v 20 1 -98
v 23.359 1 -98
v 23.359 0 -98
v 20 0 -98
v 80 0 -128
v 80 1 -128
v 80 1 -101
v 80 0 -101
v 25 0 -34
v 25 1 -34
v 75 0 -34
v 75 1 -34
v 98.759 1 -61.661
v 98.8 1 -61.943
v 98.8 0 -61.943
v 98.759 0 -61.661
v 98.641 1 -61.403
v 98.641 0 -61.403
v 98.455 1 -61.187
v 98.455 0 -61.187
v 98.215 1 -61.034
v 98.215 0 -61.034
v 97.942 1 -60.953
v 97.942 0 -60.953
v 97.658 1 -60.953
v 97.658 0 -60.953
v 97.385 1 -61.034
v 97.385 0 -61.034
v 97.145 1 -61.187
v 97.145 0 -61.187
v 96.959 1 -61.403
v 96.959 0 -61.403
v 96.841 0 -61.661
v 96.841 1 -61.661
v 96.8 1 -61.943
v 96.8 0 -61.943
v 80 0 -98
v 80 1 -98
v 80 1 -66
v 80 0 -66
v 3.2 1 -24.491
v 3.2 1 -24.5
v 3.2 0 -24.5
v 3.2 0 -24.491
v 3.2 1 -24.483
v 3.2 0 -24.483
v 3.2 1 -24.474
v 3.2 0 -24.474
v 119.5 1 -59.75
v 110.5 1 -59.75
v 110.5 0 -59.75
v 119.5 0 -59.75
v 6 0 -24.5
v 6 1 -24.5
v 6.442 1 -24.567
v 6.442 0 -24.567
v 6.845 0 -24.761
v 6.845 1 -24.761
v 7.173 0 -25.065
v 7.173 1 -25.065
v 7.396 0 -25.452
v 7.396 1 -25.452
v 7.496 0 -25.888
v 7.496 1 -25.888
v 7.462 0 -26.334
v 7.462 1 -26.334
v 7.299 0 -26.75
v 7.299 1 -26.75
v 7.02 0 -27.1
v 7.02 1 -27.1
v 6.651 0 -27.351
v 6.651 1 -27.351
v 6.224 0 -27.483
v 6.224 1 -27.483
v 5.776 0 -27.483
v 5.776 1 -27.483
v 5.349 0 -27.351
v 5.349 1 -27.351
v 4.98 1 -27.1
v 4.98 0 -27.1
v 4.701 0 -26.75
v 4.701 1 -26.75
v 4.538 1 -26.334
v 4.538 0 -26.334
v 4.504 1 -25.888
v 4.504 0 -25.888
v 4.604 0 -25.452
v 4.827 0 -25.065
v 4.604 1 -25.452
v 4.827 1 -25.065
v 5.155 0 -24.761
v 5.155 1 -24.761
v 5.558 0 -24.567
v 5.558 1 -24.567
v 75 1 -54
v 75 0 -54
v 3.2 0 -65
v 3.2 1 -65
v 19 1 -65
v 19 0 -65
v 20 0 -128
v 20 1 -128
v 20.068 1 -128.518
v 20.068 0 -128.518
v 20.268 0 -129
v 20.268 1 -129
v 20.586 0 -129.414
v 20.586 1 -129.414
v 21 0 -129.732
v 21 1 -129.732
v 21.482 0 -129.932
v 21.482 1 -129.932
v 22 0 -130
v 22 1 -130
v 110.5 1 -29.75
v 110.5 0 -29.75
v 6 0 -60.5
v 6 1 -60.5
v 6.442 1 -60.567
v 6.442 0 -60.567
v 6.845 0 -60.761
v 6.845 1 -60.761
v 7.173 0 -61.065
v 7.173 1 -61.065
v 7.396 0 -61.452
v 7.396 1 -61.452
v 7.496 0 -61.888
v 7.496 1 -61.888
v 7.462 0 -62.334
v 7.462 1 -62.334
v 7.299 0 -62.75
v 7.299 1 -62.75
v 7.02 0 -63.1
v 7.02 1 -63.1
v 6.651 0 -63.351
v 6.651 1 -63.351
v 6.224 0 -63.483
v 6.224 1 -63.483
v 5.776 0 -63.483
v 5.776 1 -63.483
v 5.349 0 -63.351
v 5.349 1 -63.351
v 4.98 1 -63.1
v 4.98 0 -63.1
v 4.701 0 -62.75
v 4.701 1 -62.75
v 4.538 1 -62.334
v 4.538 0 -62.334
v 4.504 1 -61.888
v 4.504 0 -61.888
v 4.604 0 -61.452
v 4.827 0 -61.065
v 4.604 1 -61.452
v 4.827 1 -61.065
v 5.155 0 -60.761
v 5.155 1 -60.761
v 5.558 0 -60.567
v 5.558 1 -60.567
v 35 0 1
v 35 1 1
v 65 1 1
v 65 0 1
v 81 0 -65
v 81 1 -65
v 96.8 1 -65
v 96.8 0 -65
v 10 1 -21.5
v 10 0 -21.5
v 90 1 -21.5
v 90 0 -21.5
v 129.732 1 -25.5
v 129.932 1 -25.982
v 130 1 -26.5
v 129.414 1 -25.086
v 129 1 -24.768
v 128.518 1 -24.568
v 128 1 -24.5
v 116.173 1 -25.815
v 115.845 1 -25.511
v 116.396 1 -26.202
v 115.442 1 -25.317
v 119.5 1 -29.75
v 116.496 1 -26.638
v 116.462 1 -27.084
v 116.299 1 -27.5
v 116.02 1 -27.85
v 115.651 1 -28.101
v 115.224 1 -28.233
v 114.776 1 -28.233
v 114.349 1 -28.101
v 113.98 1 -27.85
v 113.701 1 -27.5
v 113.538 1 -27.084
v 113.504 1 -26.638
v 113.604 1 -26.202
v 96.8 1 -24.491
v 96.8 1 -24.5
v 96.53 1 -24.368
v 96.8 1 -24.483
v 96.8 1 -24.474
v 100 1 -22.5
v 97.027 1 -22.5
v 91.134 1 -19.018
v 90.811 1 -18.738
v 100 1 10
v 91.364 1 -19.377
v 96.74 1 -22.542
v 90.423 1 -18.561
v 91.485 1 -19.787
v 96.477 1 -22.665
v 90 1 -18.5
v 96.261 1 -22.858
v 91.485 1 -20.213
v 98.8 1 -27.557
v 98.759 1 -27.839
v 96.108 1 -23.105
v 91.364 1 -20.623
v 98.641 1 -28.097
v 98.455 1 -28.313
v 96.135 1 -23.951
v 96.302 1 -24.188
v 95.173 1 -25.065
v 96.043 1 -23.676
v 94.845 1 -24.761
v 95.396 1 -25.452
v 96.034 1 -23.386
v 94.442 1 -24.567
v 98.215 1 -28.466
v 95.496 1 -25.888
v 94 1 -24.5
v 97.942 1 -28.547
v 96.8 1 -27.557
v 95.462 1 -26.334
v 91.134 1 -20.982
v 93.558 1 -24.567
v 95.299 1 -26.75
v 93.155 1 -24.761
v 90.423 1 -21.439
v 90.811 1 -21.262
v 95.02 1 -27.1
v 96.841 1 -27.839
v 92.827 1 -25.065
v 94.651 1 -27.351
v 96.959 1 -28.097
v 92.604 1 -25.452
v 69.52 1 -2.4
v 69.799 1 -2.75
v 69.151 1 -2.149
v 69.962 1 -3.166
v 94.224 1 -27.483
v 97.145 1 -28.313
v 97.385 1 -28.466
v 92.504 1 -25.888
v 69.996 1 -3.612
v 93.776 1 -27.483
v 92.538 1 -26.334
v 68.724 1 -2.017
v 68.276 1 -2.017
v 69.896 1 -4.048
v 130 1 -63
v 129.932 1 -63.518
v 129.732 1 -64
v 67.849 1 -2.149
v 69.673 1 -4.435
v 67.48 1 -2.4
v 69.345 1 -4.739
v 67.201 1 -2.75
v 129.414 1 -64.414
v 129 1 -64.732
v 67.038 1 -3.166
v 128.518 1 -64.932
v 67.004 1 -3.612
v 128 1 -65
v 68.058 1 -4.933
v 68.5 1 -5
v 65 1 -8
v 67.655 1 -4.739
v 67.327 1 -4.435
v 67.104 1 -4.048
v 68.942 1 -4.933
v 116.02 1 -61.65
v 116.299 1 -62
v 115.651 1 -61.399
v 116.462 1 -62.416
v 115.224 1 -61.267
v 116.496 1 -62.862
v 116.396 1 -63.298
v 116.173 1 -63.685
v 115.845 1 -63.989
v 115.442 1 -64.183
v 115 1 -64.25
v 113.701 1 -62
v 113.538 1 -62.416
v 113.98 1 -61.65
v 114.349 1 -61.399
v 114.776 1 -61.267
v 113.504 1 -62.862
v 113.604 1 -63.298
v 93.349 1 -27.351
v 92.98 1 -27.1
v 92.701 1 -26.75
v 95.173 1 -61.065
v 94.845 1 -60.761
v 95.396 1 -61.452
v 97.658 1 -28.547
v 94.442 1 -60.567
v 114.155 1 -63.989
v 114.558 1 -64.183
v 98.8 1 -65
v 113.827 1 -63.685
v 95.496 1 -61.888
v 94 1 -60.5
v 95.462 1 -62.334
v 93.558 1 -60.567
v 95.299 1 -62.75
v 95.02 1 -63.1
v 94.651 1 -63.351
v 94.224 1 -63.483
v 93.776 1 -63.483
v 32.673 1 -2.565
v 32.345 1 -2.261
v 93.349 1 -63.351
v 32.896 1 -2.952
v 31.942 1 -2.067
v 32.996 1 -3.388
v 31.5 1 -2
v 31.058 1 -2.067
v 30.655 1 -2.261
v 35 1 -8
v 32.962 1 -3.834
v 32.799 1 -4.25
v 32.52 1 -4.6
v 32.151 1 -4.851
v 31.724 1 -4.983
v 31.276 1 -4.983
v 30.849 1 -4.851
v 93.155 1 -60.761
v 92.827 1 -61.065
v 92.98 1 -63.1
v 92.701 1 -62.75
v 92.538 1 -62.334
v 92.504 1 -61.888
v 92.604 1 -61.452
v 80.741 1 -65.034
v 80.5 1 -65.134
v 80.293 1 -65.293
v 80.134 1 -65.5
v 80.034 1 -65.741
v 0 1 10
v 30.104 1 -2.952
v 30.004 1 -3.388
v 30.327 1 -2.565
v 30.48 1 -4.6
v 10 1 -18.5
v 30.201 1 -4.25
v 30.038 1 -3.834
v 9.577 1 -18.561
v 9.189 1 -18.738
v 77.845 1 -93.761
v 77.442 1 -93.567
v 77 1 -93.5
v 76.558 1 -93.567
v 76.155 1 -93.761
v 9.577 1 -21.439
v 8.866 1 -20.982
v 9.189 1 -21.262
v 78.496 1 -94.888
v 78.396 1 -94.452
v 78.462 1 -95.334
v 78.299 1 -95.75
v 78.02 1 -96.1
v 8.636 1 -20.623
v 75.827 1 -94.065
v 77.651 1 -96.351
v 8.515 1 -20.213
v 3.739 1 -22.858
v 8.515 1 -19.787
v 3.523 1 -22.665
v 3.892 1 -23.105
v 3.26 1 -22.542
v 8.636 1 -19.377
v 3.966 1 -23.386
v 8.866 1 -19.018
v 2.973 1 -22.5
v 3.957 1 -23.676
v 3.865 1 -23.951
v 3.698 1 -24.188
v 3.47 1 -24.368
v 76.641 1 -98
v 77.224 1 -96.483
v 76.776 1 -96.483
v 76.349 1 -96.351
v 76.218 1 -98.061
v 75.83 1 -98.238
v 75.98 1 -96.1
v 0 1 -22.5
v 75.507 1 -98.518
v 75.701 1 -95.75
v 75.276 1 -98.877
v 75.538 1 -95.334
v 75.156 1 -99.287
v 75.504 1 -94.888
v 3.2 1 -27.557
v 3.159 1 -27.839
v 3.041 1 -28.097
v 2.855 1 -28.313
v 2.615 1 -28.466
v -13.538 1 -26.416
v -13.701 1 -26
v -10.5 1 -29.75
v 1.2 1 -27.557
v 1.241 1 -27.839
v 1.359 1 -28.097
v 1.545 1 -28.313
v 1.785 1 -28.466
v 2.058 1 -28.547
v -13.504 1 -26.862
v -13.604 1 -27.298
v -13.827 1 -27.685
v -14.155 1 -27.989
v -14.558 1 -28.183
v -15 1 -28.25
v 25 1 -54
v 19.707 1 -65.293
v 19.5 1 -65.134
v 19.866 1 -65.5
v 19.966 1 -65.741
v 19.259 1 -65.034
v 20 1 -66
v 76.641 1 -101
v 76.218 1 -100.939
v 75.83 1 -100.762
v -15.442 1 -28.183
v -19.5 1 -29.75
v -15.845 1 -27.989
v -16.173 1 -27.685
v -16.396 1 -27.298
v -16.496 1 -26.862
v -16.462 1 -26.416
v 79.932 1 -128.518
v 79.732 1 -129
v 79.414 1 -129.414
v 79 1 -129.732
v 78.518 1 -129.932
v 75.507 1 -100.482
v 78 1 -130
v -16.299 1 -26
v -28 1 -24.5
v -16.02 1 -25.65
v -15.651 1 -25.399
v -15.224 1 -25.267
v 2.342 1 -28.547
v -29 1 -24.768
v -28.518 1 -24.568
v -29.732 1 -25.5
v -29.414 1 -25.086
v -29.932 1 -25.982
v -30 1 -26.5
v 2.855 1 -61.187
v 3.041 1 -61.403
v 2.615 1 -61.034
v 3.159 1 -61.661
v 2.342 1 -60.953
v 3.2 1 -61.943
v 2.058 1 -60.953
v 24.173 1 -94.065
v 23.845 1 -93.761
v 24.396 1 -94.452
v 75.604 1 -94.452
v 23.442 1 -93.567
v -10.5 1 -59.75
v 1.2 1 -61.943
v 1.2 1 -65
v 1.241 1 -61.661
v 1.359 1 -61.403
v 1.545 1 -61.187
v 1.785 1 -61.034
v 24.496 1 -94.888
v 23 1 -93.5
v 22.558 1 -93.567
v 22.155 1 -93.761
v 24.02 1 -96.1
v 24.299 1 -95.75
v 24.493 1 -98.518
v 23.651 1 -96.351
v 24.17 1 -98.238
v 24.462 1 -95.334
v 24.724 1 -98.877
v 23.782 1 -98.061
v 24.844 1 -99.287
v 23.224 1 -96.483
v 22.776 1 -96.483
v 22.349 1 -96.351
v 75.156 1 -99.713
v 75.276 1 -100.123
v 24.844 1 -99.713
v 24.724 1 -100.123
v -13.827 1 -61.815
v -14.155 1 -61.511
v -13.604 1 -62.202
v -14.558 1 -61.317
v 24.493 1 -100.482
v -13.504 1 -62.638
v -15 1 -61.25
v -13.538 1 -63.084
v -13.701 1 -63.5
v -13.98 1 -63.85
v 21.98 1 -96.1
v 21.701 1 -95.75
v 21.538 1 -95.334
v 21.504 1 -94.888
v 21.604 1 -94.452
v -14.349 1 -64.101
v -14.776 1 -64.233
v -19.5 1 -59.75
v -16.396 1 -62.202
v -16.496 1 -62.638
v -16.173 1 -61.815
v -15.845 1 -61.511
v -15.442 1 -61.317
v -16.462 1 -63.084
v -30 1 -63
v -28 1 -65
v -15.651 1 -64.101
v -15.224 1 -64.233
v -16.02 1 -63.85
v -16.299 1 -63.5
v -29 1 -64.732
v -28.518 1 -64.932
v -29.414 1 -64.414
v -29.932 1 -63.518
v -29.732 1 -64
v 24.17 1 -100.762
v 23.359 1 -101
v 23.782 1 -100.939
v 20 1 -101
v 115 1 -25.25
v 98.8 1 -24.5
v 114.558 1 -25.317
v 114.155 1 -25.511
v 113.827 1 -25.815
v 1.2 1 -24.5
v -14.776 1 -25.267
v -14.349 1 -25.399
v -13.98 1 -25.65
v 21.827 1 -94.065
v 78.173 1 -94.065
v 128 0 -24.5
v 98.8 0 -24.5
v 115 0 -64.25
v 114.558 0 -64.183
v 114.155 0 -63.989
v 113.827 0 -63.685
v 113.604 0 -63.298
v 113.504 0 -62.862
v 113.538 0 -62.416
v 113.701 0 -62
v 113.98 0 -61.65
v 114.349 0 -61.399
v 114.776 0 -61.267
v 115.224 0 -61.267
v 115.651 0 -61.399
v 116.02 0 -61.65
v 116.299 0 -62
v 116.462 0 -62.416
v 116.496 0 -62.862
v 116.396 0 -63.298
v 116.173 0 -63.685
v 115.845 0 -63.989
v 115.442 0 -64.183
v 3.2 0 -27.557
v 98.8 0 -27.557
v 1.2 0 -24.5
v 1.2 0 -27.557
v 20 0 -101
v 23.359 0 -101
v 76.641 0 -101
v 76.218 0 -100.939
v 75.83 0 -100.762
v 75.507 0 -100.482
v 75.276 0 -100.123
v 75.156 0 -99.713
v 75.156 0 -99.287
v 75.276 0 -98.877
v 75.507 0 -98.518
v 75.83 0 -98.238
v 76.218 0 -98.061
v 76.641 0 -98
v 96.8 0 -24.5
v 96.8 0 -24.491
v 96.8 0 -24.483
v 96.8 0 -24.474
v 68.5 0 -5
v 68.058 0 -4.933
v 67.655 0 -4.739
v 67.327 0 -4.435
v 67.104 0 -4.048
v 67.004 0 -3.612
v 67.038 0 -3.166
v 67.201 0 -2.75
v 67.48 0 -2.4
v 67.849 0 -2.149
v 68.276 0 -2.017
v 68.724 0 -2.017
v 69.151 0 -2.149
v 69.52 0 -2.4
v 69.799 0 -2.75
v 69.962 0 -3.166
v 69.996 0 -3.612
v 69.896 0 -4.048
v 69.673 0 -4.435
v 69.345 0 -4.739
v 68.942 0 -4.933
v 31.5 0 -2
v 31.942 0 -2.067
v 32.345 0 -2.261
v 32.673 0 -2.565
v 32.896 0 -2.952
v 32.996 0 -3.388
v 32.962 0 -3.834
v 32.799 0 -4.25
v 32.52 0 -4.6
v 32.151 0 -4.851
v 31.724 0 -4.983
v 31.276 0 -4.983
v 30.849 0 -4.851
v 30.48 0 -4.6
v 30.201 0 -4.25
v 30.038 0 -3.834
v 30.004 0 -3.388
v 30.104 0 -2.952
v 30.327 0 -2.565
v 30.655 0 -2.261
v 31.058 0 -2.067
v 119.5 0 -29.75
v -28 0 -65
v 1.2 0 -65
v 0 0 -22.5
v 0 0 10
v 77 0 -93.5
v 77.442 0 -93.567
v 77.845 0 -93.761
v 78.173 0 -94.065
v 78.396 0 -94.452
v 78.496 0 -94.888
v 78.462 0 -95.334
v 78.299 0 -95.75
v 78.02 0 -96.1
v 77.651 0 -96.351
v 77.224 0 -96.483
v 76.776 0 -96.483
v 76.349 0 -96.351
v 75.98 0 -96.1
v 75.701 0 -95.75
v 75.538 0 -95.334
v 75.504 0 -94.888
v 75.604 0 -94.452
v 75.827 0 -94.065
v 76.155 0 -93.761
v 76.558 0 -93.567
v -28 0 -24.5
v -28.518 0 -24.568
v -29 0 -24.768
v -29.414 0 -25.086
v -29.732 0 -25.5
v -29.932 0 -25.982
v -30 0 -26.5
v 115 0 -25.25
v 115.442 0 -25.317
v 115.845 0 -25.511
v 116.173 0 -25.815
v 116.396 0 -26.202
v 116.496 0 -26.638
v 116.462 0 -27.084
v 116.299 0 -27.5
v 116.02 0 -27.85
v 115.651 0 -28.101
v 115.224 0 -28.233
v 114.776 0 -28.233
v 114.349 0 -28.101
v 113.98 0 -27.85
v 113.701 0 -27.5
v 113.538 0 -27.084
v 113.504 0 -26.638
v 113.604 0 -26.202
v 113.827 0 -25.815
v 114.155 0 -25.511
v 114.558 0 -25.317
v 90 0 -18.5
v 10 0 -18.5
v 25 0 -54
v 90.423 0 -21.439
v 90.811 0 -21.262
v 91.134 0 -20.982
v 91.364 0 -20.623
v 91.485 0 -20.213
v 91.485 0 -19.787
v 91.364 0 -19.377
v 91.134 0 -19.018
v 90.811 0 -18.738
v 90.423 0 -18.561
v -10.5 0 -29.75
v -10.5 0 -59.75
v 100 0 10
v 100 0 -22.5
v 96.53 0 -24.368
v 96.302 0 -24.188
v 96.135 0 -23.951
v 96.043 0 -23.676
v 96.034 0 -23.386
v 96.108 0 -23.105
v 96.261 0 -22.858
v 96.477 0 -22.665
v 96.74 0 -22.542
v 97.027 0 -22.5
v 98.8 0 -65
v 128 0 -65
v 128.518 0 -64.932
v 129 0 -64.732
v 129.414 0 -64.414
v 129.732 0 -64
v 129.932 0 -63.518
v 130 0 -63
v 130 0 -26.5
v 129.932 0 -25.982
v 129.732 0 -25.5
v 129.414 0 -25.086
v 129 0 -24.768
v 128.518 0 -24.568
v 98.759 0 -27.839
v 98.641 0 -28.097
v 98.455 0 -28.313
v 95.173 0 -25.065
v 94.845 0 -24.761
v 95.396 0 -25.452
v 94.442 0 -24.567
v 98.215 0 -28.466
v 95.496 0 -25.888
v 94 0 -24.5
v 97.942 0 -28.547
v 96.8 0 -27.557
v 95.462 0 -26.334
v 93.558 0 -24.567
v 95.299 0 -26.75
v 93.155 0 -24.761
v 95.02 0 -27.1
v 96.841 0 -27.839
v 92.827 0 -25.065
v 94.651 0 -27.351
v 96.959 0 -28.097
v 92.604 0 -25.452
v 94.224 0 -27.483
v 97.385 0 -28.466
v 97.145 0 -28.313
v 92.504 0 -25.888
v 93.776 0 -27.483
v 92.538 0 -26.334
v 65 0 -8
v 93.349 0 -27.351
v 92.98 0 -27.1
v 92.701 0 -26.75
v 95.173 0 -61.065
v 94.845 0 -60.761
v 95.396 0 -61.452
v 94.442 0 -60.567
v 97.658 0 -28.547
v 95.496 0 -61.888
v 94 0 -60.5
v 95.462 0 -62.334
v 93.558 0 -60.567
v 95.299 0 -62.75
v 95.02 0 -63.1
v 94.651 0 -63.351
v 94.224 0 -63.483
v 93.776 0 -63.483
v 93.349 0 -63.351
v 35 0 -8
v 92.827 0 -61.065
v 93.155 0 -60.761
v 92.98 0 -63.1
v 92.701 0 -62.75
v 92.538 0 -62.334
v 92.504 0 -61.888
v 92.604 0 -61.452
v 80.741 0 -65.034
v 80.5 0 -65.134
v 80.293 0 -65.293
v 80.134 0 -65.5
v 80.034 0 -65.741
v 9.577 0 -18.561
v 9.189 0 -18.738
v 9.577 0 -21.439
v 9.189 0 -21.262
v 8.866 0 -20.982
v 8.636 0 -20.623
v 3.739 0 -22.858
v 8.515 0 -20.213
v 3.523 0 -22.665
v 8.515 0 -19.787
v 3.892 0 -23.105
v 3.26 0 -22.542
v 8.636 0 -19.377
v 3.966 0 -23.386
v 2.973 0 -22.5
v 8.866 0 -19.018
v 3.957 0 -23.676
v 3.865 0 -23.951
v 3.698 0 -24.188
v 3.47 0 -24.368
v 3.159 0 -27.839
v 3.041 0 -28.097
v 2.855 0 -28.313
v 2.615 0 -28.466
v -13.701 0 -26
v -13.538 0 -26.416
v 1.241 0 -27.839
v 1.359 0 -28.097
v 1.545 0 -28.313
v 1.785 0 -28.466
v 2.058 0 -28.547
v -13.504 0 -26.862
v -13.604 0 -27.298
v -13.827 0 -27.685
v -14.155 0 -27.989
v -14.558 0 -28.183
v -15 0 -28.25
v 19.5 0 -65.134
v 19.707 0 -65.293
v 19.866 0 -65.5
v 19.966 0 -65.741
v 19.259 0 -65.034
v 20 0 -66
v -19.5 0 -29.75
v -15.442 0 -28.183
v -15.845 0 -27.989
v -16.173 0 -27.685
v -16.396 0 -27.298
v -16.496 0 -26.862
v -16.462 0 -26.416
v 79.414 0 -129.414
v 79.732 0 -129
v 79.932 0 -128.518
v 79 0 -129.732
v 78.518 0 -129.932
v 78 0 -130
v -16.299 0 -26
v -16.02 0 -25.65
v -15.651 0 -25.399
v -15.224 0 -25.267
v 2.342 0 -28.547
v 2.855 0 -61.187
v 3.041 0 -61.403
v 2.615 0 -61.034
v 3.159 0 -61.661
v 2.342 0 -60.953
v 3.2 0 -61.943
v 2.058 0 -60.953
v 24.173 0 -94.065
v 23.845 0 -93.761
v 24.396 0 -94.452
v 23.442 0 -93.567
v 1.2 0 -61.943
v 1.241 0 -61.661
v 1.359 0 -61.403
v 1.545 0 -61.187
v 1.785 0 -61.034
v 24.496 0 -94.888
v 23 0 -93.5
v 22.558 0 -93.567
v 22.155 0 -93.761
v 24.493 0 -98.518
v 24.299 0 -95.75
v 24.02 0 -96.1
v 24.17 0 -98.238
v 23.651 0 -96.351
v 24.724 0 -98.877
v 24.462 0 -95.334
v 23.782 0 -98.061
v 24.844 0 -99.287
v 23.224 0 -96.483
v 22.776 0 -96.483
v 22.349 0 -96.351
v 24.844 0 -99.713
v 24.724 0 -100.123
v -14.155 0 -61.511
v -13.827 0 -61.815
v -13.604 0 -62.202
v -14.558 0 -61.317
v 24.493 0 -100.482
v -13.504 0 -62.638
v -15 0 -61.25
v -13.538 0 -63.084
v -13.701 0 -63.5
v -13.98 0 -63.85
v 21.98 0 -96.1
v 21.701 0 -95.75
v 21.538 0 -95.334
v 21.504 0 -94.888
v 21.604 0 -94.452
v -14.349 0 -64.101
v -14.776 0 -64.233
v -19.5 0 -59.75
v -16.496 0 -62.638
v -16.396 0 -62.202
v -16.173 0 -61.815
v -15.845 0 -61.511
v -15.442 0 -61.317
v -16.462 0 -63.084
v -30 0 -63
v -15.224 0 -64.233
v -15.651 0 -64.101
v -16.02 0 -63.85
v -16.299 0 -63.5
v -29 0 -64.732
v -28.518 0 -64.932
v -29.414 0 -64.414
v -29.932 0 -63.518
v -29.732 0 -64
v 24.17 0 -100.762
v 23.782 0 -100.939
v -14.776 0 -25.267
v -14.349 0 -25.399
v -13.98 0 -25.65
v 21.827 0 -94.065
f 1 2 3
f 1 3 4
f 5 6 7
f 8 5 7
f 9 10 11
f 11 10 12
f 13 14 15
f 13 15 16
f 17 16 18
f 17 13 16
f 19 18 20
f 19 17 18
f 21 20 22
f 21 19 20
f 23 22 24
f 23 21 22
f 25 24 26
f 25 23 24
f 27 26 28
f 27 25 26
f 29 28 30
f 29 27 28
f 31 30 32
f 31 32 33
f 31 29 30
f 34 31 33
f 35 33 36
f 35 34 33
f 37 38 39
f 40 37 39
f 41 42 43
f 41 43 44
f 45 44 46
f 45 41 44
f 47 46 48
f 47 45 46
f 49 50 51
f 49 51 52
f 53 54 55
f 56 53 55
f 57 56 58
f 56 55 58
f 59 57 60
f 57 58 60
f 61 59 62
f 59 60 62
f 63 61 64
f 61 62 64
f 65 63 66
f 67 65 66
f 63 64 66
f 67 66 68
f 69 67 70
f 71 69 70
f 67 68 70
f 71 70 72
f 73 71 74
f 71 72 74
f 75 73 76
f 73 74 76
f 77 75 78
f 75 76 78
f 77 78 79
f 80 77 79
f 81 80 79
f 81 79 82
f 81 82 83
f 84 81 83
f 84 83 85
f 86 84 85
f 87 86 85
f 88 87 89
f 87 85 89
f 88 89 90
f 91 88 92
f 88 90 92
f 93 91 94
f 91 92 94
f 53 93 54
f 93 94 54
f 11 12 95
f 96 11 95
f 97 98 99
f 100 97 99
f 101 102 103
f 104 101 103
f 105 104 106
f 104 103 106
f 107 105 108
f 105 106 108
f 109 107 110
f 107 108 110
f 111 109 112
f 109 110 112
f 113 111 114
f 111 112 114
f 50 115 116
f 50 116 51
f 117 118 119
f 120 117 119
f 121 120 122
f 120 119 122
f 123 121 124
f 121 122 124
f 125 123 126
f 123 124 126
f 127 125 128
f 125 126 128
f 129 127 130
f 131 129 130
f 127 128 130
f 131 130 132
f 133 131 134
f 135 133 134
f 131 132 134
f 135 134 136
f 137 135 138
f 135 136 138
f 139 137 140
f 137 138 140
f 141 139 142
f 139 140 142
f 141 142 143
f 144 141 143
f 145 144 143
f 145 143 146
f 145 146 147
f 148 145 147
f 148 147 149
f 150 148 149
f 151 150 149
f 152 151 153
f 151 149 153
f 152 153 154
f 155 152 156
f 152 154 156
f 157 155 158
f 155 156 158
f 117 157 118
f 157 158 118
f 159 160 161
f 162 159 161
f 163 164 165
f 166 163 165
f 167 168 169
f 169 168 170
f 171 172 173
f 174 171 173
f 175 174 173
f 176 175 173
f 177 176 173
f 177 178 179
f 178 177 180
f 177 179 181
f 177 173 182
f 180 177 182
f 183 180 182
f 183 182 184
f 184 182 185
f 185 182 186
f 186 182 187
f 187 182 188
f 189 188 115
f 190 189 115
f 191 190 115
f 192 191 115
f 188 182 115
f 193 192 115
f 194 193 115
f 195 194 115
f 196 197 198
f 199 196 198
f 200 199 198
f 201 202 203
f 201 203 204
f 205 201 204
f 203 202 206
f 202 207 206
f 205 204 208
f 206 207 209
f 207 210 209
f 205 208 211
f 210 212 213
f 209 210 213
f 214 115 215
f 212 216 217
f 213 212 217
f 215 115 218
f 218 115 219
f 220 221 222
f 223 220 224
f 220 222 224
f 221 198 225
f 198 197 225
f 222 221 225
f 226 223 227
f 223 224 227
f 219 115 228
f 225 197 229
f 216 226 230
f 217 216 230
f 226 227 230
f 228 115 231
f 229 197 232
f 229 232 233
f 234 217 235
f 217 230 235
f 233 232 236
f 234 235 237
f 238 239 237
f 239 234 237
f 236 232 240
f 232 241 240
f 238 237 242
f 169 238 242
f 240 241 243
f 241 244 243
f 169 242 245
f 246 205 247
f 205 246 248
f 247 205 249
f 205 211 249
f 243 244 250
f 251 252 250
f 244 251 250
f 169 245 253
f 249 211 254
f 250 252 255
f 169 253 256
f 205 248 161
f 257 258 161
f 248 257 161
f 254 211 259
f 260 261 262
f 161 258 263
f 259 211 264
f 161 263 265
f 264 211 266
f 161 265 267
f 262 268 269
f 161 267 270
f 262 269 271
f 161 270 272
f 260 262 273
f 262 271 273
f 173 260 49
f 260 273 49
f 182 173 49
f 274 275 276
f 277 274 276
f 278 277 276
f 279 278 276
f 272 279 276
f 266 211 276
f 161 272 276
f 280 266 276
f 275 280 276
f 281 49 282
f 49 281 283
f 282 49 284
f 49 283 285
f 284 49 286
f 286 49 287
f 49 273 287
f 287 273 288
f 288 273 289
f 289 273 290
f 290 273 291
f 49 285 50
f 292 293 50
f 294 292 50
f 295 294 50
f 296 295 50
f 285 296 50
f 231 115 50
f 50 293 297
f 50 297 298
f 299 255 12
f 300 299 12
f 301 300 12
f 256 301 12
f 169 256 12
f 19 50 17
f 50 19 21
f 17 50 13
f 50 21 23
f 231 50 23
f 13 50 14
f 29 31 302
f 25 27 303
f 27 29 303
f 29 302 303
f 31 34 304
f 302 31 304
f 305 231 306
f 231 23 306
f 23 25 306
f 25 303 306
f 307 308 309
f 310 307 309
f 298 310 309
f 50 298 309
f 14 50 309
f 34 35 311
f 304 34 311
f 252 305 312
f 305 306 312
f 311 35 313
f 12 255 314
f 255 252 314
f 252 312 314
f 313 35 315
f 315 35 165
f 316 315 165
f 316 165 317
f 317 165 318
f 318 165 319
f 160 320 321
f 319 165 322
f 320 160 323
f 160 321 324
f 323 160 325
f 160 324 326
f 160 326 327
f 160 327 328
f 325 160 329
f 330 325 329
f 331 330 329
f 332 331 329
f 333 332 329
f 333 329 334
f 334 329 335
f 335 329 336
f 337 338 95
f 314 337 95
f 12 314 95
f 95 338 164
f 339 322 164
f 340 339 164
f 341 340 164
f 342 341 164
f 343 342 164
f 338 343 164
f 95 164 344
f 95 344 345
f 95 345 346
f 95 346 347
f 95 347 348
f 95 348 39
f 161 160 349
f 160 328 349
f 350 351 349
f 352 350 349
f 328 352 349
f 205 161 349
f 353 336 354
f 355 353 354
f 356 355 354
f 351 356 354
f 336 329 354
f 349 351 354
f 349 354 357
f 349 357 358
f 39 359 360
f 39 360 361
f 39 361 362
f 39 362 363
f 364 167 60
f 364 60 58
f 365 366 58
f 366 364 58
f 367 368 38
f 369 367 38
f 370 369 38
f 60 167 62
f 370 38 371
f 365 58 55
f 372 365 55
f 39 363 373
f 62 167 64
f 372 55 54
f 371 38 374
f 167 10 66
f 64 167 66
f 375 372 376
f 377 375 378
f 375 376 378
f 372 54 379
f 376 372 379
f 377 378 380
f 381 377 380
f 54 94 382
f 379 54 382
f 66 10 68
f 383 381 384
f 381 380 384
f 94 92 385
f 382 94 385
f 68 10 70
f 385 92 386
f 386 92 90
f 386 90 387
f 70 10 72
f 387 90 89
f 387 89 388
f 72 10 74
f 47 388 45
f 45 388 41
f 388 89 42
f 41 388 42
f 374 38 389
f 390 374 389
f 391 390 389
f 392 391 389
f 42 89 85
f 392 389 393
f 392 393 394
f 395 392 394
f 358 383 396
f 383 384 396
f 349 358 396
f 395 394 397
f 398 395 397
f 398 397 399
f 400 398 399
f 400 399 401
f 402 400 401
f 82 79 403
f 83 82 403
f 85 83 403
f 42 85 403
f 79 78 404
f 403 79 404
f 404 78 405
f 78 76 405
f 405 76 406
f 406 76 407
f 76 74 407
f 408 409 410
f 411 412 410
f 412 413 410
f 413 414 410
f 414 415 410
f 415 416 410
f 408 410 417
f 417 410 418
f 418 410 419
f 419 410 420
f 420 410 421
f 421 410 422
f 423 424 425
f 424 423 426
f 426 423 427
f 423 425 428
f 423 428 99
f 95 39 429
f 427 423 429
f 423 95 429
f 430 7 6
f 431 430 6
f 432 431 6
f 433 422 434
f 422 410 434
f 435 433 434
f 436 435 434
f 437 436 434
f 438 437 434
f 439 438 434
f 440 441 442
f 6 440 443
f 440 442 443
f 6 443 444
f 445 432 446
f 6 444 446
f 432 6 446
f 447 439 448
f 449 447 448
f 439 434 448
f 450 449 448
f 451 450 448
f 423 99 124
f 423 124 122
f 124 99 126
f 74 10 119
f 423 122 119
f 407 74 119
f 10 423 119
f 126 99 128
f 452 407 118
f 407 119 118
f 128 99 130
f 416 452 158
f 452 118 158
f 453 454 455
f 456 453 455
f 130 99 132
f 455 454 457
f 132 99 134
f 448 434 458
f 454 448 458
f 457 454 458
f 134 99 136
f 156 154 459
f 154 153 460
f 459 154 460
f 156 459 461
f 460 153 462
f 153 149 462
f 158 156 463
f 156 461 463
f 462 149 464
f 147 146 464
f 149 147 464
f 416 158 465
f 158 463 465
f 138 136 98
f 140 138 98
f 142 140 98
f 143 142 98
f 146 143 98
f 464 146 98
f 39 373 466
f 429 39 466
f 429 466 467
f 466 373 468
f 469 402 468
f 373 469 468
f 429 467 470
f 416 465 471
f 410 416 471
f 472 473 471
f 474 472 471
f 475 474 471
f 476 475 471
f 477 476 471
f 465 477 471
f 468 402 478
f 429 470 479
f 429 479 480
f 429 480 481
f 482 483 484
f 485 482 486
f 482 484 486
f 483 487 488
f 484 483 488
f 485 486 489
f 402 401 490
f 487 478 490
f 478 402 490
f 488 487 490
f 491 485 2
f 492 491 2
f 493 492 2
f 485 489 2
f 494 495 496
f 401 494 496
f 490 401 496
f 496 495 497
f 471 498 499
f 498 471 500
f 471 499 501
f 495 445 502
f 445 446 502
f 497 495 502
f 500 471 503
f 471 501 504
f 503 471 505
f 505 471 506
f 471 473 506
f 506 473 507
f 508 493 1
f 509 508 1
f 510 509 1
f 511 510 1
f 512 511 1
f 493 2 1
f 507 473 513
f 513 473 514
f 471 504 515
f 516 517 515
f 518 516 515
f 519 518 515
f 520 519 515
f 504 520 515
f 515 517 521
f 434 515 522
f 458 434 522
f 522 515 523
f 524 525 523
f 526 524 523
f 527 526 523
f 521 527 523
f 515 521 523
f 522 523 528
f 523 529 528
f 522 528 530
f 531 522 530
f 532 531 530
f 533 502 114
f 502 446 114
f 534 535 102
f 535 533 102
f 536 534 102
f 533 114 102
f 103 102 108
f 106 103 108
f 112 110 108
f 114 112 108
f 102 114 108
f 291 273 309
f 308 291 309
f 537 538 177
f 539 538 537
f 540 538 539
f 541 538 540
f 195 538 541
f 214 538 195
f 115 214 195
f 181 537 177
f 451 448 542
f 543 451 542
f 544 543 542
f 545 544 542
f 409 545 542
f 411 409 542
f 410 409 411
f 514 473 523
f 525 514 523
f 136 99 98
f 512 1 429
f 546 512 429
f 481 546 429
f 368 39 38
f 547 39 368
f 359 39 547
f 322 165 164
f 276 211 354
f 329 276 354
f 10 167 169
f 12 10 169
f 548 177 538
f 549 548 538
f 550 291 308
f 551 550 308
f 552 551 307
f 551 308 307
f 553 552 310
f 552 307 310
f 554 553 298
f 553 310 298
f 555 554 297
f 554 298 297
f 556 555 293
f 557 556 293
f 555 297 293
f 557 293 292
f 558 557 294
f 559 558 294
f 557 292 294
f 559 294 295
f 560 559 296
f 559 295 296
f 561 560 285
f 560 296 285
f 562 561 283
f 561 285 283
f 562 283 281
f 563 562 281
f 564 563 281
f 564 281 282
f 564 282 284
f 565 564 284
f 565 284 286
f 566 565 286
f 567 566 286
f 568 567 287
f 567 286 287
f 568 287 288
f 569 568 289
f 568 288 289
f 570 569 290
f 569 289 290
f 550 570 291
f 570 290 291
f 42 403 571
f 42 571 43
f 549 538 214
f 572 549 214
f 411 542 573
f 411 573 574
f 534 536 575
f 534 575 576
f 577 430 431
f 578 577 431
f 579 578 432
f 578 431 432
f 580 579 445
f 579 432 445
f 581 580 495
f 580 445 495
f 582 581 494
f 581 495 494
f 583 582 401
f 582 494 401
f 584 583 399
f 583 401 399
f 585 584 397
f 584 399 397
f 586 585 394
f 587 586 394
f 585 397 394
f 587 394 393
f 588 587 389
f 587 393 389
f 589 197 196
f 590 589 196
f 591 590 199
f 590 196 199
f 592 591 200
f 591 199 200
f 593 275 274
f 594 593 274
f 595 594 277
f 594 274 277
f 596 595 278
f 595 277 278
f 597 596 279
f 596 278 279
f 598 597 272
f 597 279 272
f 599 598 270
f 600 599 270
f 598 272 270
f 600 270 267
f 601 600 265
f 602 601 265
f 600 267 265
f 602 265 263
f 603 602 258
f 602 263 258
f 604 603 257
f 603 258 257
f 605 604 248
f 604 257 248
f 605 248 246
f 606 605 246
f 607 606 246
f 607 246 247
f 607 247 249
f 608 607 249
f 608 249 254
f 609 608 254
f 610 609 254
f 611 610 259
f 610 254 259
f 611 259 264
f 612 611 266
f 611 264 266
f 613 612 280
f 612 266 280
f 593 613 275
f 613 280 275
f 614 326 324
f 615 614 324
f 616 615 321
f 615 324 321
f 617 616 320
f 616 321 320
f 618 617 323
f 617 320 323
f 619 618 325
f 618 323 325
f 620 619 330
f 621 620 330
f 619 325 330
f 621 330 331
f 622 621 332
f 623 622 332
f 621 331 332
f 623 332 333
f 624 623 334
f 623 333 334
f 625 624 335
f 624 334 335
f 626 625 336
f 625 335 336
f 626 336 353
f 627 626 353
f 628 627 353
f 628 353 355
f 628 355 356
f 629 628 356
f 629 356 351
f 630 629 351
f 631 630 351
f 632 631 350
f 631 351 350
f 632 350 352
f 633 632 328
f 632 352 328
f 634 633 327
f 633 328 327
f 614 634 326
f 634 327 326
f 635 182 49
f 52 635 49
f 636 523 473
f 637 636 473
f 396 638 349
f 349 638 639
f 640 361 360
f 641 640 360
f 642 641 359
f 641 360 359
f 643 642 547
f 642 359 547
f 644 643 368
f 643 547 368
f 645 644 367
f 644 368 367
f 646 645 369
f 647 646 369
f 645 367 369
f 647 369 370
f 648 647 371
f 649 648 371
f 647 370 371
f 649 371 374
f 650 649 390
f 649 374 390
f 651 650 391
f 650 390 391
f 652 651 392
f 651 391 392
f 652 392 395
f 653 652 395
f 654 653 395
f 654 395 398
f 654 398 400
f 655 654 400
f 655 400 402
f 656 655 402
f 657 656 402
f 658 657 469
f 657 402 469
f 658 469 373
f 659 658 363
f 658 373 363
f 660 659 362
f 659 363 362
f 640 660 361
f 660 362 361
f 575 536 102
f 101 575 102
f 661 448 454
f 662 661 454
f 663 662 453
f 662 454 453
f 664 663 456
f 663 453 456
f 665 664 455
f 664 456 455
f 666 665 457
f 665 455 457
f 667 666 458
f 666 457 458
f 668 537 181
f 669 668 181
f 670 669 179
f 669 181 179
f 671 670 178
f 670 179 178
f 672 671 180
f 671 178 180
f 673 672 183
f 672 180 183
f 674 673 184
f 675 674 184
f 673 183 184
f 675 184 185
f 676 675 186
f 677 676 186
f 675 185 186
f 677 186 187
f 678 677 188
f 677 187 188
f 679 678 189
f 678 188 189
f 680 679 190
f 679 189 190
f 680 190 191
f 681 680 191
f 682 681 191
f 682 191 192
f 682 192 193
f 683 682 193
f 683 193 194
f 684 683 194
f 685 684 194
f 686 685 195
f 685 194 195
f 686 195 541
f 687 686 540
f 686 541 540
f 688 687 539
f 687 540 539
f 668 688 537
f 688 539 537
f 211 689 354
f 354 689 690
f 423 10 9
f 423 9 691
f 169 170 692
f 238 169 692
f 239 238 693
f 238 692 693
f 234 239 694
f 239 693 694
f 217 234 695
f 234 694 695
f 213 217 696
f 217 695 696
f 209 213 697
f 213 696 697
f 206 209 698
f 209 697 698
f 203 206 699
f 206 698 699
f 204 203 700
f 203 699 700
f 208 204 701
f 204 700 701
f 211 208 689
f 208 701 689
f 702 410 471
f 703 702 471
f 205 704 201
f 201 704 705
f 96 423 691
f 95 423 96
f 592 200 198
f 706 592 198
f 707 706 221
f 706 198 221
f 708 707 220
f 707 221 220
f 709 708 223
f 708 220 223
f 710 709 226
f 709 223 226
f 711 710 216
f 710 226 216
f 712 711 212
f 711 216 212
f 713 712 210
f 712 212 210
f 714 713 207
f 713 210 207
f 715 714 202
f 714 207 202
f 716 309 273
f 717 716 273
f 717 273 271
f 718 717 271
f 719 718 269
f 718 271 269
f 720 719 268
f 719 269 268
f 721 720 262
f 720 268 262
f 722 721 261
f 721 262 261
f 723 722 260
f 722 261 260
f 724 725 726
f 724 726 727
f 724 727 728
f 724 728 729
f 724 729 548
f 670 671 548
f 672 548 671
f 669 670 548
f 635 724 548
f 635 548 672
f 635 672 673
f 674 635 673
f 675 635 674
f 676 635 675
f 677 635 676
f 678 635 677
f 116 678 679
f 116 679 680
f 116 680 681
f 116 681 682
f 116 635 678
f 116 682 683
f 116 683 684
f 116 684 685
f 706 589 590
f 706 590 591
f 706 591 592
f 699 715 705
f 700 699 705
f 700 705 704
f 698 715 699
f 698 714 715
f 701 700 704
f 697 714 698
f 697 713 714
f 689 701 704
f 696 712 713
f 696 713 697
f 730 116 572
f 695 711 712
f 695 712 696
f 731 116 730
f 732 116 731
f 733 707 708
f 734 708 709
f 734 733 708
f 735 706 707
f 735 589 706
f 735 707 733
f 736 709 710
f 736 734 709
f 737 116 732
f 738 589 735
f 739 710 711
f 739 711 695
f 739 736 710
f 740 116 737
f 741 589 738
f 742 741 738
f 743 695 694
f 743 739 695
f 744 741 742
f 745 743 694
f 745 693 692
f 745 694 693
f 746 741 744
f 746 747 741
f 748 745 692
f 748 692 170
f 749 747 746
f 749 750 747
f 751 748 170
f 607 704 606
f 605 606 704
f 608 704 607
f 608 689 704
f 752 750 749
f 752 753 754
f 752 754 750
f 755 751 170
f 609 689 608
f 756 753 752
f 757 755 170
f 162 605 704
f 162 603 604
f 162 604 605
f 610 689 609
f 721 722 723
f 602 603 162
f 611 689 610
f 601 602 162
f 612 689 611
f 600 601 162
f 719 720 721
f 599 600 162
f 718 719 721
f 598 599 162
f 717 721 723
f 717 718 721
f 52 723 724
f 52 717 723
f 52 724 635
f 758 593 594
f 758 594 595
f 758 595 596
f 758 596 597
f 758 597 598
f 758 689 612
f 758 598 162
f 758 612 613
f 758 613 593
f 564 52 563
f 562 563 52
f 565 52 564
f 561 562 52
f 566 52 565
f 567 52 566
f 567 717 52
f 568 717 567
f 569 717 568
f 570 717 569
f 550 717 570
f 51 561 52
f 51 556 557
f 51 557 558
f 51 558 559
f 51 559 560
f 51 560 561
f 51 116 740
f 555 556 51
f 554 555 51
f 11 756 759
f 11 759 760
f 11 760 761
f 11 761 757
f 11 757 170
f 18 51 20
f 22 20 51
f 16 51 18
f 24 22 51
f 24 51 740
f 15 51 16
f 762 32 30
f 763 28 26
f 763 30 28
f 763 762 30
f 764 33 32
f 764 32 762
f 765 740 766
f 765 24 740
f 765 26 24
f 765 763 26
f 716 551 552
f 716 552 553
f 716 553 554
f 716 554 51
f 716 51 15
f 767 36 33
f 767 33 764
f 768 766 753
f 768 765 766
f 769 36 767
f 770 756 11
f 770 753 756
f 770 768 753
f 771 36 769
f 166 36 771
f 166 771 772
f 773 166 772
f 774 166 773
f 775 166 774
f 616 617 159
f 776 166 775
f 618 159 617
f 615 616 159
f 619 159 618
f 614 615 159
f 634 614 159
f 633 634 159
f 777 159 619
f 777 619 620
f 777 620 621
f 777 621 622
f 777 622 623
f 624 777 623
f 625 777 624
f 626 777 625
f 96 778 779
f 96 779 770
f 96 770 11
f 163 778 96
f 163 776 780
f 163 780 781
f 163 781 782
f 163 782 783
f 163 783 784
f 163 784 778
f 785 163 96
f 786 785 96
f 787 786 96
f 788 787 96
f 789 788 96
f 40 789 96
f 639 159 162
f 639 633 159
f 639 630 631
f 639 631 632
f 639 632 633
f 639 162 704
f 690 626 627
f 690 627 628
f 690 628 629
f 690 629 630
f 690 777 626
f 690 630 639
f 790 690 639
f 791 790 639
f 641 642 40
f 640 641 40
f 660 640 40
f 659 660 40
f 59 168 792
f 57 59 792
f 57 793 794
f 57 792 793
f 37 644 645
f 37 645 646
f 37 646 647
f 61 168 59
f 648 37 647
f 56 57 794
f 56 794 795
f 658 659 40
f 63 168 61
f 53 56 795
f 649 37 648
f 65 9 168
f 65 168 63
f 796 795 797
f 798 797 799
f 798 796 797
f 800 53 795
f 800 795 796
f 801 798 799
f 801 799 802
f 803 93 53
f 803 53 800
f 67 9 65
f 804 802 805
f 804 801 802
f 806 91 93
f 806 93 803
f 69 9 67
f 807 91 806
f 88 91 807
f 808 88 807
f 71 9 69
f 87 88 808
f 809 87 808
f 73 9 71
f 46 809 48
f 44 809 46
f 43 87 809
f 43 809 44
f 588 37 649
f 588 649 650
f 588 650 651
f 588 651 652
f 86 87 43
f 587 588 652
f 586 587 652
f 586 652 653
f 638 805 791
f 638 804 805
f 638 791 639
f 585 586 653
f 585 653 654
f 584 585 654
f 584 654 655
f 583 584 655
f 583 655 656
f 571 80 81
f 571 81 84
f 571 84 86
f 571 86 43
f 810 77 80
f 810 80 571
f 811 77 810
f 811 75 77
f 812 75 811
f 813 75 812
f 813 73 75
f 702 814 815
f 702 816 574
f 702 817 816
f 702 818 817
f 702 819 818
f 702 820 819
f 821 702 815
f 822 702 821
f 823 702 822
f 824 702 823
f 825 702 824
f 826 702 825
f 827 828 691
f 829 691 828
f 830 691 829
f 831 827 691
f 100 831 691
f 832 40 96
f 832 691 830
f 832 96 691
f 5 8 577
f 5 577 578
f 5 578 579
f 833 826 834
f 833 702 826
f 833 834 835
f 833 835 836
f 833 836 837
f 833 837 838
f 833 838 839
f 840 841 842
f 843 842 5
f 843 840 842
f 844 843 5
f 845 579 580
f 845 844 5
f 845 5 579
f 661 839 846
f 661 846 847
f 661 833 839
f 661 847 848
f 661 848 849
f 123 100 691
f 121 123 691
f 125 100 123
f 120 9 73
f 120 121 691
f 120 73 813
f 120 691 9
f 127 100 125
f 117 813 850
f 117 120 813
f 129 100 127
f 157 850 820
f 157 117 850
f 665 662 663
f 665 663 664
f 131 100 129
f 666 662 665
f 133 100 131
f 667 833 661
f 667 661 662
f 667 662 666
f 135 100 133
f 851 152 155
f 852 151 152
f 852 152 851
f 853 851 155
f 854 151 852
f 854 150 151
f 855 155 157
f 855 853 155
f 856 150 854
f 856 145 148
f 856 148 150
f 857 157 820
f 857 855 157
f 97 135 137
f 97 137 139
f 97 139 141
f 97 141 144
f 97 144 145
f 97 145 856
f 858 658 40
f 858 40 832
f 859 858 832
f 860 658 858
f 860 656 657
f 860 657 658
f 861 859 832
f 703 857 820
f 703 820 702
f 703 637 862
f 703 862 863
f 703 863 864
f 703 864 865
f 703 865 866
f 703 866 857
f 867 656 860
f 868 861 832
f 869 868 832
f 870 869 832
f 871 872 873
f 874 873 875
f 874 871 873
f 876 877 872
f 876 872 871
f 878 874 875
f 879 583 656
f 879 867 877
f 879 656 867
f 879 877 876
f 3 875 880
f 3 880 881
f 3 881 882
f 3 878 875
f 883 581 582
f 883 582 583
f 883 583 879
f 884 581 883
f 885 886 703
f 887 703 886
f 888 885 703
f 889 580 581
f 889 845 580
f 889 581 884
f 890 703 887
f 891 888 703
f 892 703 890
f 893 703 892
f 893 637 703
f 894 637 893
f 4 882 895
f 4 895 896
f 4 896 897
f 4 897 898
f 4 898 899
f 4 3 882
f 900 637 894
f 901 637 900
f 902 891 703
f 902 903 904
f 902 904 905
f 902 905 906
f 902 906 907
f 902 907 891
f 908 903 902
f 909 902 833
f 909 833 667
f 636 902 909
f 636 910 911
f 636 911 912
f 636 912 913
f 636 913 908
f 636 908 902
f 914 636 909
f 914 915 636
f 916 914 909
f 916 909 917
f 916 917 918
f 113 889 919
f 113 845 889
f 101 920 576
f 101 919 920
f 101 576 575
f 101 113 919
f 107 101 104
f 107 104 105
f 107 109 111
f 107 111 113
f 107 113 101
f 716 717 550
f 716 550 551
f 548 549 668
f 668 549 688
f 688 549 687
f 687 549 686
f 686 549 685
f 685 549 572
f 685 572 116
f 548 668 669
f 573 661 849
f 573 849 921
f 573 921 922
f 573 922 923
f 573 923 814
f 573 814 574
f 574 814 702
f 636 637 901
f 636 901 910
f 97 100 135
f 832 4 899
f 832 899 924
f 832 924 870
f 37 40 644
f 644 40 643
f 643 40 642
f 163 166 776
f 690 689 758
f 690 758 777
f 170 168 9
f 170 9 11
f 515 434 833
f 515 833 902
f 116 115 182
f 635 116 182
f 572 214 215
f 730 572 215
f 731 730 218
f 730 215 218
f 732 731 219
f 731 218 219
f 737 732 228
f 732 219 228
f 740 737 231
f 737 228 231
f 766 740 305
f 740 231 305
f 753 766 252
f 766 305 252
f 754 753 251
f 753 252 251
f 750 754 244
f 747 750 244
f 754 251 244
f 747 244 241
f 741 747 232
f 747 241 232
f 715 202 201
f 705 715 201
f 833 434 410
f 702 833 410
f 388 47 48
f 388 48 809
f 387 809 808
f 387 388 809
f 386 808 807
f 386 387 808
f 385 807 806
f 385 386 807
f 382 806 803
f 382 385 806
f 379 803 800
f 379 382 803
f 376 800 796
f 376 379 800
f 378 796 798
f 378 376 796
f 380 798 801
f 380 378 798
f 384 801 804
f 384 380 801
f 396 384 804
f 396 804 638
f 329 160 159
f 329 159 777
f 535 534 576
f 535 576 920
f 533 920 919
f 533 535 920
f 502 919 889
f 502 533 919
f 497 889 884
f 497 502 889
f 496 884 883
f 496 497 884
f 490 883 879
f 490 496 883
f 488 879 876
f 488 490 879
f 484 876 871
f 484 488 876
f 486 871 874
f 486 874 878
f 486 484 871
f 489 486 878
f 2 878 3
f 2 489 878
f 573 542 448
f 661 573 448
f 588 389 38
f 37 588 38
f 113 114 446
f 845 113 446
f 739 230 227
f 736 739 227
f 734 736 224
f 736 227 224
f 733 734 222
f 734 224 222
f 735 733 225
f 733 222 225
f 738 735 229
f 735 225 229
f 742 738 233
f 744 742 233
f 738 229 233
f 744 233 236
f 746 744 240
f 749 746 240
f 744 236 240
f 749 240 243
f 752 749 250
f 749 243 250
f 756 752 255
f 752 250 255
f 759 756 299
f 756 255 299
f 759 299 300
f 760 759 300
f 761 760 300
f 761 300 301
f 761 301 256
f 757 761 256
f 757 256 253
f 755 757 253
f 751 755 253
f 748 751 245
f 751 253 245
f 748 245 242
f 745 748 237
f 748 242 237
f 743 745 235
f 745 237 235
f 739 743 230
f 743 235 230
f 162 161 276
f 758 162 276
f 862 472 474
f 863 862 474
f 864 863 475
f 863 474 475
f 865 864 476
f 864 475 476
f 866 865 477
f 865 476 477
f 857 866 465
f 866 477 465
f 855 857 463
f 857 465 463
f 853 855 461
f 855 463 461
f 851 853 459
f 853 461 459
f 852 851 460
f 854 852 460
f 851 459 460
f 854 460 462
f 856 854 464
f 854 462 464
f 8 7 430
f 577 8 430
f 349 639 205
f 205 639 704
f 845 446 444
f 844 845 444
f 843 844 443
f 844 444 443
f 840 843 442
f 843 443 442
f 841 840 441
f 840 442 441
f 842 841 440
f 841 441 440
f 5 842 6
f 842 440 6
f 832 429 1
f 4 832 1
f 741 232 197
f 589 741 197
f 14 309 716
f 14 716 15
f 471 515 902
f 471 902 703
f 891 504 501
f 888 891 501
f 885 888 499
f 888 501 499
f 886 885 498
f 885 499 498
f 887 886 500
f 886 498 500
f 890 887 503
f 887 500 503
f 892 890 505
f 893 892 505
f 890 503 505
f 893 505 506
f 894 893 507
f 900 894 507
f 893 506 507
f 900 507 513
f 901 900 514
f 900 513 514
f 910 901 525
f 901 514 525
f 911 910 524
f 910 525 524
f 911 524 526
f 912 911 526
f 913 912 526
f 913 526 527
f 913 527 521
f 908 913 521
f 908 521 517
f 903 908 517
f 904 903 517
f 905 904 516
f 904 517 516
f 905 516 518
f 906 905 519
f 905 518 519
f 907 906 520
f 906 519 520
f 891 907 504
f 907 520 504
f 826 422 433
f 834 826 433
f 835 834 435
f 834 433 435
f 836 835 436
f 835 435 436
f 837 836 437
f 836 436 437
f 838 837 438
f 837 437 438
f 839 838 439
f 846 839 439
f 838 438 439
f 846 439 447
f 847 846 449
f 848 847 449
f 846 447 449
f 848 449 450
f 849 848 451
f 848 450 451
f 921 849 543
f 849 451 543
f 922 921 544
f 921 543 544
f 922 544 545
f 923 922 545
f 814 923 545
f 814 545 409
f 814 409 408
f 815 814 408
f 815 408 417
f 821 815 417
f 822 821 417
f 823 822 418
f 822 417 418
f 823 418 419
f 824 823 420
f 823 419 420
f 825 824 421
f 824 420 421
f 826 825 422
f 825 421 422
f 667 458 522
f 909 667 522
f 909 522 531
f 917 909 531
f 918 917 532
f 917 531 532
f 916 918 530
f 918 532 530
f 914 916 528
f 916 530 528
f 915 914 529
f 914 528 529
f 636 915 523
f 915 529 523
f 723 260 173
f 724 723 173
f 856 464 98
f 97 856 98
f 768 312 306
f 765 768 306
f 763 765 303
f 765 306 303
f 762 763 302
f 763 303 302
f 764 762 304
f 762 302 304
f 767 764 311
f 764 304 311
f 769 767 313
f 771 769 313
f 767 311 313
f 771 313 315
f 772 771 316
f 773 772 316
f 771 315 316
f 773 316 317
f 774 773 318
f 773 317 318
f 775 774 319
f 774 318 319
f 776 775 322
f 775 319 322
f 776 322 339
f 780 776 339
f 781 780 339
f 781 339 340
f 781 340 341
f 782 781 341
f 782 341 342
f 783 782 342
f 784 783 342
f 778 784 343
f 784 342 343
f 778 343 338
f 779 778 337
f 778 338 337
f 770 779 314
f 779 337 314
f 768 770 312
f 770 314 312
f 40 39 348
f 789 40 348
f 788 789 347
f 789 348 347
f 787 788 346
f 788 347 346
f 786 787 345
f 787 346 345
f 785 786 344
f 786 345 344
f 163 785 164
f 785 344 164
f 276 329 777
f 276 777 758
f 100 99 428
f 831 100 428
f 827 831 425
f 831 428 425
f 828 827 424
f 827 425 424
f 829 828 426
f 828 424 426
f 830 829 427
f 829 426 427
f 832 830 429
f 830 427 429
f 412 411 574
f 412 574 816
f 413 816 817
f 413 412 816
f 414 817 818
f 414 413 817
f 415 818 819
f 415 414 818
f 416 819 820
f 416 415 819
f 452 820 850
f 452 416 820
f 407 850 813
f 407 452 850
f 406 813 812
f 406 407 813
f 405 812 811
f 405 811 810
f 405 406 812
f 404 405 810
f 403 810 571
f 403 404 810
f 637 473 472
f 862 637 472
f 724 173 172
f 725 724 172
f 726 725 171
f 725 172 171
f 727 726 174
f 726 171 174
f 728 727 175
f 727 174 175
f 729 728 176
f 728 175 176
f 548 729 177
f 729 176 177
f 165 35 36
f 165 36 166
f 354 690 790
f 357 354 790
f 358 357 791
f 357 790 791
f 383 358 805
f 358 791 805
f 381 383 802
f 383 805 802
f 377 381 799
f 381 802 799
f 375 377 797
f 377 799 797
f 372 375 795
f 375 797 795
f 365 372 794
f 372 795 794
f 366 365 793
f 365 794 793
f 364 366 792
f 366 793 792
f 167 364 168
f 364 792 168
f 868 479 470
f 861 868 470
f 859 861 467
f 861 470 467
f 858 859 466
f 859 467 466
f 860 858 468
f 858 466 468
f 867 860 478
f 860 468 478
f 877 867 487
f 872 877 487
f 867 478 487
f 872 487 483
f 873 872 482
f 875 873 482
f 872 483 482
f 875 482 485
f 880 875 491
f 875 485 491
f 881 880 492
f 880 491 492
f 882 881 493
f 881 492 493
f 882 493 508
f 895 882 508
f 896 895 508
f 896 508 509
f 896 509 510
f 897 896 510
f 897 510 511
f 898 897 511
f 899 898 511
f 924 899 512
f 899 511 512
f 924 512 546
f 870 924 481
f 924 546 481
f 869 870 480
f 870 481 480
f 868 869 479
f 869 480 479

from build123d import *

# Parameters (mm, degrees)
BOSS_EXTRUDE1_DEPTH = 1
CUT_EXTRUDE2_DEPTH  = 1
SKETCH3_R           = 1.5
CUT_EXTRUDE3_DEPTH  = 1
BOSS_EXTRUDE2_START = -1
BOSS_EXTRUDE2_DEPTH = 1
BOSS_EXTRUDE3_DEPTH = 1
SKETCH6_R           = 1.5
SKETCH6_W           = 9
SKETCH6_H           = 30
SKETCH6_W_2         = 30
SKETCH6_H_2         = 9
CUT_EXTRUDE4_DEPTH  = 1
CUT_EXTRUDE5_DEPTH  = 1
SKETCH8_W           = 50
SKETCH8_H           = 20
CUT_EXTRUDE6_DEPTH  = 1


with BuildPart() as part:
    # Sketch1 → Boss-Extrude1 (new body)
    with BuildSketch(Plane(origin=(0, 0, 0), x_dir=(1, 0, 0), z_dir=(0, 1, 0))):
        with BuildLine():
            Line((1, 0), (99, 0))
            ThreePointArc((99, 0), (99.707106781, 0.292893219), (100, 1))
            Line((100, 1), (100, 99))
            ThreePointArc((100, 99), (99.707106781, 99.707106781), (99, 100))
            Line((99, 100), (1, 100))
            ThreePointArc((1, 100), (0.292893219, 99.707106781), (0, 99))
            Line((0, 99), (0, 1))
            ThreePointArc((0, 1), (0.292893219, 0.292893219), (1, 0))
        make_face()
        with BuildLine():
            Line((10, 21.5), (90, 21.5))
            ThreePointArc((90, 21.5), (91.5, 20), (90, 18.5))
            Line((90, 18.5), (10, 18.5))
            ThreePointArc((10, 18.5), (8.5, 20), (10, 21.5))
        make_face(mode=Mode.SUBTRACT)
    extrude(amount=BOSS_EXTRUDE1_DEPTH)

    # Sketch2 → Cut-Extrude2 (cut)
    with BuildSketch(Plane(origin=(0, 1, 0), x_dir=(1, 0, 0), z_dir=(0, 1, 0))):
        with BuildLine():
            Line((0, 100), (0, 65))
            Line((0, 65), (19, 65))
            ThreePointArc((19, 65), (19.707106781, 65.292893219), (20, 66))
            Line((20, 66), (20, 100))
            Line((20, 100), (0, 100))
        make_face()
        with BuildLine():
            Line((100, 65), (100, 100))
            Line((100, 100), (80, 100))
            Line((80, 100), (80, 66))
            ThreePointArc((80, 66), (80.292893219, 65.292893219), (81, 65))
            Line((81, 65), (100, 65))
        make_face()
    extrude(amount=-CUT_EXTRUDE2_DEPTH, mode=Mode.SUBTRACT)

    # Sketch3 → Cut-Extrude3 (cut)
    with BuildSketch(Plane(origin=(0, 1, 0), x_dir=(1, 0, 0), z_dir=(0, 1, 0))):
        with Locations(Location((6, 26, 0), (0, 0, 270))):
            Circle(SKETCH3_R)
        with Locations(Location((23, 95, 0), (0, 0, 270))):
            Circle(SKETCH3_R)
        with Locations(Location((77, 95, 0), (0, 0, 270))):
            Circle(SKETCH3_R)
        with Locations(Location((94, 26, 0), (0, 0, 270))):
            Circle(SKETCH3_R)
        with Locations(Location((6, 62, 0), (0, 0, 270))):
            Circle(SKETCH3_R)
        with Locations(Location((94, 62, 0), (0, 0, 270))):
            Circle(SKETCH3_R)
    extrude(amount=-CUT_EXTRUDE3_DEPTH, mode=Mode.SUBTRACT)

    # Sketch4 → Boss-Extrude2 (add)
    with BuildSketch(Plane(origin=(0, 1, 0), x_dir=(1, 0, 0), z_dir=(0, 1, 0)).offset(BOSS_EXTRUDE2_START)):
        with BuildLine():
            Line((0, 1), (0, -10))
            Line((0, -10), (100, -10))
            Line((100, -10), (100, 1))
            ThreePointArc((100, 1), (99.707106781, 0.292893219), (99, 0))
            Line((99, 0), (1, 0))
            ThreePointArc((1, 0), (0.292893219, 0.292893219), (0, 1))
        make_face()
    extrude(amount=BOSS_EXTRUDE2_DEPTH)

    # Sketch5 → Boss-Extrude3 (add)
    with BuildSketch(Plane(origin=(0, 1, 0), x_dir=(1, 0, 0), z_dir=(0, 1, 0))):
        with BuildLine():
            Line((100, 65), (128, 65))
            ThreePointArc((128, 65), (129.414213562, 64.414213562), (130, 63))
            Line((130, 63), (130, 26.5))
            ThreePointArc((130, 26.5), (129.414213562, 25.085786438), (128, 24.5))
            Line((128, 24.5), (100, 24.5))
            Line((100, 24.5), (100, 65))
        make_face()
        with BuildLine():
            Line((0, 24.5), (-28, 24.5))
            ThreePointArc((-28, 24.5), (-29.414213562, 25.085786438), (-30, 26.5))
            Line((-30, 26.5), (-30, 63))
            ThreePointArc((-30, 63), (-29.414213562, 64.414213562), (-28, 65))
            Line((-28, 65), (0, 65))
            Line((0, 65), (0, 24.5))
        make_face()
        with BuildLine():
            Line((80, 100), (20, 100))
            Line((20, 100), (20, 128))
            ThreePointArc((20, 128), (20.585786438, 129.414213562), (22, 130))
            Line((22, 130), (78, 130))
            ThreePointArc((78, 130), (79.414213562, 129.414213562), (80, 128))
            Line((80, 128), (80, 100))
        make_face()
    extrude(amount=-BOSS_EXTRUDE3_DEPTH)

    # Sketch6 → Cut-Extrude4 (cut)
    with BuildSketch(Plane(origin=(0, 1, 0), x_dir=(1, 0, 0), z_dir=(0, 1, 0))):
        with Locations(Location((31.5, 3.5, 0), (0, 0, 270))):
            Circle(SKETCH6_R)
        with Locations(Location((-15, 62.75, 0), (0, 0, 270))):
            Circle(SKETCH6_R)
        with Locations(Location((-15, 26.75, 0), (0, 0, 90))):
            Circle(SKETCH6_R)
        with Locations(Location((68.5, 3.5, 0), (0, 0, 90))):
            Circle(SKETCH6_R)
        with Locations(Location((115, 26.75, 0), (0, 0, 270))):
            Circle(SKETCH6_R)
        with Locations(Location((115, 62.75, 0), (0, 0, 90))):
            Circle(SKETCH6_R)
        with Locations((115, 44.75)):
            Rectangle(SKETCH6_W, SKETCH6_H)
        with Locations((-15, 44.75)):
            Rectangle(SKETCH6_W, SKETCH6_H)
        with Locations((50, 3.5)):
            Rectangle(SKETCH6_W_2, SKETCH6_H_2)
    extrude(amount=-CUT_EXTRUDE4_DEPTH, mode=Mode.SUBTRACT)

    # Sketch7 → Cut-Extrude5 (cut)
    with BuildSketch(Plane(origin=(0, 1, 0), x_dir=(1, 0, 0), z_dir=(0, 1, 0))):
        with BuildLine():
            Line((0, 24.5), (2.972707359, 24.5))
            ThreePointArc((2.972707359, 24.5), (3.972707359, 23.5), (2.972707359, 22.5))
            Line((2.972707359, 22.5), (0, 22.5))
            ThreePointArc((0, 22.5), (-1, 23.5), (0, 24.5))
        make_face()
        with BuildLine():
            Line((19.996436831, 101), (23.359178087, 101))
            ThreePointArc((23.359178087, 101), (24.859178087, 99.5), (23.359178087, 98))
            Line((23.359178087, 98), (19.996436831, 98))
            ThreePointArc((19.996436831, 98), (18.496436831, 99.5), (19.996436831, 101))
        make_face()
        with BuildLine():
            Line((1.2, 24.5), (1.2, 27.556784127))
            ThreePointArc((1.2, 27.556784127), (2.2, 28.556784127), (3.2, 27.556784127))
            Line((3.2, 27.556784127), (3.2, 24.5))
            ThreePointArc((3.2, 24.5), (2.2, 23.5), (1.2, 24.5))
        make_face()
        with BuildLine():
            Line((1.2, 65), (1.2, 61.943215873))
            ThreePointArc((1.2, 61.943215873), (2.2, 60.943215873), (3.2, 61.943215873))
            Line((3.2, 61.943215873), (3.2, 65))
            ThreePointArc((3.2, 65), (2.2, 66), (1.2, 65))
        make_face()
        with BuildLine():
            Line((80.003563169, 101), (76.640821913, 101))
            ThreePointArc((76.640821913, 101), (75.140821913, 99.5), (76.640821913, 98))
            Line((76.640821913, 98), (80.003563169, 98))
            ThreePointArc((80.003563169, 98), (81.503563169, 99.5), (80.003563169, 101))
        make_face()
        with BuildLine():
            Line((98.8, 24.5), (98.8, 27.556784127))
            ThreePointArc((98.8, 27.556784127), (97.8, 28.556784127), (96.8, 27.556784127))
            Line((96.8, 27.556784127), (96.8, 24.5))
            ThreePointArc((96.8, 24.5), (97.8, 23.5), (98.8, 24.5))
        make_face()
        with BuildLine():
            Line((100, 24.5), (97.027292641, 24.5))
            ThreePointArc((97.027292641, 24.5), (96.027292641, 23.5), (97.027292641, 22.5))
            Line((97.027292641, 22.5), (100, 22.5))
            ThreePointArc((100, 22.5), (101, 23.5), (100, 24.5))
        make_face()
        with BuildLine():
            Line((98.8, 65), (98.8, 61.943215873))
            ThreePointArc((98.8, 61.943215873), (97.8, 60.943215873), (96.8, 61.943215873))
            Line((96.8, 61.943215873), (96.8, 65))
            ThreePointArc((96.8, 65), (97.8, 66), (98.8, 65))
        make_face()
    extrude(amount=-CUT_EXTRUDE5_DEPTH, mode=Mode.SUBTRACT)

    # Sketch8 → Cut-Extrude6 (cut)
    with BuildSketch(Plane(origin=(0, 1, 0), x_dir=(1, 0, 0), z_dir=(0, 1, 0))):
        with Locations((50, 44)):
            Rectangle(SKETCH8_W, SKETCH8_H)
    extrude(amount=-CUT_EXTRUDE6_DEPTH, mode=Mode.SUBTRACT)


solid = part.part
